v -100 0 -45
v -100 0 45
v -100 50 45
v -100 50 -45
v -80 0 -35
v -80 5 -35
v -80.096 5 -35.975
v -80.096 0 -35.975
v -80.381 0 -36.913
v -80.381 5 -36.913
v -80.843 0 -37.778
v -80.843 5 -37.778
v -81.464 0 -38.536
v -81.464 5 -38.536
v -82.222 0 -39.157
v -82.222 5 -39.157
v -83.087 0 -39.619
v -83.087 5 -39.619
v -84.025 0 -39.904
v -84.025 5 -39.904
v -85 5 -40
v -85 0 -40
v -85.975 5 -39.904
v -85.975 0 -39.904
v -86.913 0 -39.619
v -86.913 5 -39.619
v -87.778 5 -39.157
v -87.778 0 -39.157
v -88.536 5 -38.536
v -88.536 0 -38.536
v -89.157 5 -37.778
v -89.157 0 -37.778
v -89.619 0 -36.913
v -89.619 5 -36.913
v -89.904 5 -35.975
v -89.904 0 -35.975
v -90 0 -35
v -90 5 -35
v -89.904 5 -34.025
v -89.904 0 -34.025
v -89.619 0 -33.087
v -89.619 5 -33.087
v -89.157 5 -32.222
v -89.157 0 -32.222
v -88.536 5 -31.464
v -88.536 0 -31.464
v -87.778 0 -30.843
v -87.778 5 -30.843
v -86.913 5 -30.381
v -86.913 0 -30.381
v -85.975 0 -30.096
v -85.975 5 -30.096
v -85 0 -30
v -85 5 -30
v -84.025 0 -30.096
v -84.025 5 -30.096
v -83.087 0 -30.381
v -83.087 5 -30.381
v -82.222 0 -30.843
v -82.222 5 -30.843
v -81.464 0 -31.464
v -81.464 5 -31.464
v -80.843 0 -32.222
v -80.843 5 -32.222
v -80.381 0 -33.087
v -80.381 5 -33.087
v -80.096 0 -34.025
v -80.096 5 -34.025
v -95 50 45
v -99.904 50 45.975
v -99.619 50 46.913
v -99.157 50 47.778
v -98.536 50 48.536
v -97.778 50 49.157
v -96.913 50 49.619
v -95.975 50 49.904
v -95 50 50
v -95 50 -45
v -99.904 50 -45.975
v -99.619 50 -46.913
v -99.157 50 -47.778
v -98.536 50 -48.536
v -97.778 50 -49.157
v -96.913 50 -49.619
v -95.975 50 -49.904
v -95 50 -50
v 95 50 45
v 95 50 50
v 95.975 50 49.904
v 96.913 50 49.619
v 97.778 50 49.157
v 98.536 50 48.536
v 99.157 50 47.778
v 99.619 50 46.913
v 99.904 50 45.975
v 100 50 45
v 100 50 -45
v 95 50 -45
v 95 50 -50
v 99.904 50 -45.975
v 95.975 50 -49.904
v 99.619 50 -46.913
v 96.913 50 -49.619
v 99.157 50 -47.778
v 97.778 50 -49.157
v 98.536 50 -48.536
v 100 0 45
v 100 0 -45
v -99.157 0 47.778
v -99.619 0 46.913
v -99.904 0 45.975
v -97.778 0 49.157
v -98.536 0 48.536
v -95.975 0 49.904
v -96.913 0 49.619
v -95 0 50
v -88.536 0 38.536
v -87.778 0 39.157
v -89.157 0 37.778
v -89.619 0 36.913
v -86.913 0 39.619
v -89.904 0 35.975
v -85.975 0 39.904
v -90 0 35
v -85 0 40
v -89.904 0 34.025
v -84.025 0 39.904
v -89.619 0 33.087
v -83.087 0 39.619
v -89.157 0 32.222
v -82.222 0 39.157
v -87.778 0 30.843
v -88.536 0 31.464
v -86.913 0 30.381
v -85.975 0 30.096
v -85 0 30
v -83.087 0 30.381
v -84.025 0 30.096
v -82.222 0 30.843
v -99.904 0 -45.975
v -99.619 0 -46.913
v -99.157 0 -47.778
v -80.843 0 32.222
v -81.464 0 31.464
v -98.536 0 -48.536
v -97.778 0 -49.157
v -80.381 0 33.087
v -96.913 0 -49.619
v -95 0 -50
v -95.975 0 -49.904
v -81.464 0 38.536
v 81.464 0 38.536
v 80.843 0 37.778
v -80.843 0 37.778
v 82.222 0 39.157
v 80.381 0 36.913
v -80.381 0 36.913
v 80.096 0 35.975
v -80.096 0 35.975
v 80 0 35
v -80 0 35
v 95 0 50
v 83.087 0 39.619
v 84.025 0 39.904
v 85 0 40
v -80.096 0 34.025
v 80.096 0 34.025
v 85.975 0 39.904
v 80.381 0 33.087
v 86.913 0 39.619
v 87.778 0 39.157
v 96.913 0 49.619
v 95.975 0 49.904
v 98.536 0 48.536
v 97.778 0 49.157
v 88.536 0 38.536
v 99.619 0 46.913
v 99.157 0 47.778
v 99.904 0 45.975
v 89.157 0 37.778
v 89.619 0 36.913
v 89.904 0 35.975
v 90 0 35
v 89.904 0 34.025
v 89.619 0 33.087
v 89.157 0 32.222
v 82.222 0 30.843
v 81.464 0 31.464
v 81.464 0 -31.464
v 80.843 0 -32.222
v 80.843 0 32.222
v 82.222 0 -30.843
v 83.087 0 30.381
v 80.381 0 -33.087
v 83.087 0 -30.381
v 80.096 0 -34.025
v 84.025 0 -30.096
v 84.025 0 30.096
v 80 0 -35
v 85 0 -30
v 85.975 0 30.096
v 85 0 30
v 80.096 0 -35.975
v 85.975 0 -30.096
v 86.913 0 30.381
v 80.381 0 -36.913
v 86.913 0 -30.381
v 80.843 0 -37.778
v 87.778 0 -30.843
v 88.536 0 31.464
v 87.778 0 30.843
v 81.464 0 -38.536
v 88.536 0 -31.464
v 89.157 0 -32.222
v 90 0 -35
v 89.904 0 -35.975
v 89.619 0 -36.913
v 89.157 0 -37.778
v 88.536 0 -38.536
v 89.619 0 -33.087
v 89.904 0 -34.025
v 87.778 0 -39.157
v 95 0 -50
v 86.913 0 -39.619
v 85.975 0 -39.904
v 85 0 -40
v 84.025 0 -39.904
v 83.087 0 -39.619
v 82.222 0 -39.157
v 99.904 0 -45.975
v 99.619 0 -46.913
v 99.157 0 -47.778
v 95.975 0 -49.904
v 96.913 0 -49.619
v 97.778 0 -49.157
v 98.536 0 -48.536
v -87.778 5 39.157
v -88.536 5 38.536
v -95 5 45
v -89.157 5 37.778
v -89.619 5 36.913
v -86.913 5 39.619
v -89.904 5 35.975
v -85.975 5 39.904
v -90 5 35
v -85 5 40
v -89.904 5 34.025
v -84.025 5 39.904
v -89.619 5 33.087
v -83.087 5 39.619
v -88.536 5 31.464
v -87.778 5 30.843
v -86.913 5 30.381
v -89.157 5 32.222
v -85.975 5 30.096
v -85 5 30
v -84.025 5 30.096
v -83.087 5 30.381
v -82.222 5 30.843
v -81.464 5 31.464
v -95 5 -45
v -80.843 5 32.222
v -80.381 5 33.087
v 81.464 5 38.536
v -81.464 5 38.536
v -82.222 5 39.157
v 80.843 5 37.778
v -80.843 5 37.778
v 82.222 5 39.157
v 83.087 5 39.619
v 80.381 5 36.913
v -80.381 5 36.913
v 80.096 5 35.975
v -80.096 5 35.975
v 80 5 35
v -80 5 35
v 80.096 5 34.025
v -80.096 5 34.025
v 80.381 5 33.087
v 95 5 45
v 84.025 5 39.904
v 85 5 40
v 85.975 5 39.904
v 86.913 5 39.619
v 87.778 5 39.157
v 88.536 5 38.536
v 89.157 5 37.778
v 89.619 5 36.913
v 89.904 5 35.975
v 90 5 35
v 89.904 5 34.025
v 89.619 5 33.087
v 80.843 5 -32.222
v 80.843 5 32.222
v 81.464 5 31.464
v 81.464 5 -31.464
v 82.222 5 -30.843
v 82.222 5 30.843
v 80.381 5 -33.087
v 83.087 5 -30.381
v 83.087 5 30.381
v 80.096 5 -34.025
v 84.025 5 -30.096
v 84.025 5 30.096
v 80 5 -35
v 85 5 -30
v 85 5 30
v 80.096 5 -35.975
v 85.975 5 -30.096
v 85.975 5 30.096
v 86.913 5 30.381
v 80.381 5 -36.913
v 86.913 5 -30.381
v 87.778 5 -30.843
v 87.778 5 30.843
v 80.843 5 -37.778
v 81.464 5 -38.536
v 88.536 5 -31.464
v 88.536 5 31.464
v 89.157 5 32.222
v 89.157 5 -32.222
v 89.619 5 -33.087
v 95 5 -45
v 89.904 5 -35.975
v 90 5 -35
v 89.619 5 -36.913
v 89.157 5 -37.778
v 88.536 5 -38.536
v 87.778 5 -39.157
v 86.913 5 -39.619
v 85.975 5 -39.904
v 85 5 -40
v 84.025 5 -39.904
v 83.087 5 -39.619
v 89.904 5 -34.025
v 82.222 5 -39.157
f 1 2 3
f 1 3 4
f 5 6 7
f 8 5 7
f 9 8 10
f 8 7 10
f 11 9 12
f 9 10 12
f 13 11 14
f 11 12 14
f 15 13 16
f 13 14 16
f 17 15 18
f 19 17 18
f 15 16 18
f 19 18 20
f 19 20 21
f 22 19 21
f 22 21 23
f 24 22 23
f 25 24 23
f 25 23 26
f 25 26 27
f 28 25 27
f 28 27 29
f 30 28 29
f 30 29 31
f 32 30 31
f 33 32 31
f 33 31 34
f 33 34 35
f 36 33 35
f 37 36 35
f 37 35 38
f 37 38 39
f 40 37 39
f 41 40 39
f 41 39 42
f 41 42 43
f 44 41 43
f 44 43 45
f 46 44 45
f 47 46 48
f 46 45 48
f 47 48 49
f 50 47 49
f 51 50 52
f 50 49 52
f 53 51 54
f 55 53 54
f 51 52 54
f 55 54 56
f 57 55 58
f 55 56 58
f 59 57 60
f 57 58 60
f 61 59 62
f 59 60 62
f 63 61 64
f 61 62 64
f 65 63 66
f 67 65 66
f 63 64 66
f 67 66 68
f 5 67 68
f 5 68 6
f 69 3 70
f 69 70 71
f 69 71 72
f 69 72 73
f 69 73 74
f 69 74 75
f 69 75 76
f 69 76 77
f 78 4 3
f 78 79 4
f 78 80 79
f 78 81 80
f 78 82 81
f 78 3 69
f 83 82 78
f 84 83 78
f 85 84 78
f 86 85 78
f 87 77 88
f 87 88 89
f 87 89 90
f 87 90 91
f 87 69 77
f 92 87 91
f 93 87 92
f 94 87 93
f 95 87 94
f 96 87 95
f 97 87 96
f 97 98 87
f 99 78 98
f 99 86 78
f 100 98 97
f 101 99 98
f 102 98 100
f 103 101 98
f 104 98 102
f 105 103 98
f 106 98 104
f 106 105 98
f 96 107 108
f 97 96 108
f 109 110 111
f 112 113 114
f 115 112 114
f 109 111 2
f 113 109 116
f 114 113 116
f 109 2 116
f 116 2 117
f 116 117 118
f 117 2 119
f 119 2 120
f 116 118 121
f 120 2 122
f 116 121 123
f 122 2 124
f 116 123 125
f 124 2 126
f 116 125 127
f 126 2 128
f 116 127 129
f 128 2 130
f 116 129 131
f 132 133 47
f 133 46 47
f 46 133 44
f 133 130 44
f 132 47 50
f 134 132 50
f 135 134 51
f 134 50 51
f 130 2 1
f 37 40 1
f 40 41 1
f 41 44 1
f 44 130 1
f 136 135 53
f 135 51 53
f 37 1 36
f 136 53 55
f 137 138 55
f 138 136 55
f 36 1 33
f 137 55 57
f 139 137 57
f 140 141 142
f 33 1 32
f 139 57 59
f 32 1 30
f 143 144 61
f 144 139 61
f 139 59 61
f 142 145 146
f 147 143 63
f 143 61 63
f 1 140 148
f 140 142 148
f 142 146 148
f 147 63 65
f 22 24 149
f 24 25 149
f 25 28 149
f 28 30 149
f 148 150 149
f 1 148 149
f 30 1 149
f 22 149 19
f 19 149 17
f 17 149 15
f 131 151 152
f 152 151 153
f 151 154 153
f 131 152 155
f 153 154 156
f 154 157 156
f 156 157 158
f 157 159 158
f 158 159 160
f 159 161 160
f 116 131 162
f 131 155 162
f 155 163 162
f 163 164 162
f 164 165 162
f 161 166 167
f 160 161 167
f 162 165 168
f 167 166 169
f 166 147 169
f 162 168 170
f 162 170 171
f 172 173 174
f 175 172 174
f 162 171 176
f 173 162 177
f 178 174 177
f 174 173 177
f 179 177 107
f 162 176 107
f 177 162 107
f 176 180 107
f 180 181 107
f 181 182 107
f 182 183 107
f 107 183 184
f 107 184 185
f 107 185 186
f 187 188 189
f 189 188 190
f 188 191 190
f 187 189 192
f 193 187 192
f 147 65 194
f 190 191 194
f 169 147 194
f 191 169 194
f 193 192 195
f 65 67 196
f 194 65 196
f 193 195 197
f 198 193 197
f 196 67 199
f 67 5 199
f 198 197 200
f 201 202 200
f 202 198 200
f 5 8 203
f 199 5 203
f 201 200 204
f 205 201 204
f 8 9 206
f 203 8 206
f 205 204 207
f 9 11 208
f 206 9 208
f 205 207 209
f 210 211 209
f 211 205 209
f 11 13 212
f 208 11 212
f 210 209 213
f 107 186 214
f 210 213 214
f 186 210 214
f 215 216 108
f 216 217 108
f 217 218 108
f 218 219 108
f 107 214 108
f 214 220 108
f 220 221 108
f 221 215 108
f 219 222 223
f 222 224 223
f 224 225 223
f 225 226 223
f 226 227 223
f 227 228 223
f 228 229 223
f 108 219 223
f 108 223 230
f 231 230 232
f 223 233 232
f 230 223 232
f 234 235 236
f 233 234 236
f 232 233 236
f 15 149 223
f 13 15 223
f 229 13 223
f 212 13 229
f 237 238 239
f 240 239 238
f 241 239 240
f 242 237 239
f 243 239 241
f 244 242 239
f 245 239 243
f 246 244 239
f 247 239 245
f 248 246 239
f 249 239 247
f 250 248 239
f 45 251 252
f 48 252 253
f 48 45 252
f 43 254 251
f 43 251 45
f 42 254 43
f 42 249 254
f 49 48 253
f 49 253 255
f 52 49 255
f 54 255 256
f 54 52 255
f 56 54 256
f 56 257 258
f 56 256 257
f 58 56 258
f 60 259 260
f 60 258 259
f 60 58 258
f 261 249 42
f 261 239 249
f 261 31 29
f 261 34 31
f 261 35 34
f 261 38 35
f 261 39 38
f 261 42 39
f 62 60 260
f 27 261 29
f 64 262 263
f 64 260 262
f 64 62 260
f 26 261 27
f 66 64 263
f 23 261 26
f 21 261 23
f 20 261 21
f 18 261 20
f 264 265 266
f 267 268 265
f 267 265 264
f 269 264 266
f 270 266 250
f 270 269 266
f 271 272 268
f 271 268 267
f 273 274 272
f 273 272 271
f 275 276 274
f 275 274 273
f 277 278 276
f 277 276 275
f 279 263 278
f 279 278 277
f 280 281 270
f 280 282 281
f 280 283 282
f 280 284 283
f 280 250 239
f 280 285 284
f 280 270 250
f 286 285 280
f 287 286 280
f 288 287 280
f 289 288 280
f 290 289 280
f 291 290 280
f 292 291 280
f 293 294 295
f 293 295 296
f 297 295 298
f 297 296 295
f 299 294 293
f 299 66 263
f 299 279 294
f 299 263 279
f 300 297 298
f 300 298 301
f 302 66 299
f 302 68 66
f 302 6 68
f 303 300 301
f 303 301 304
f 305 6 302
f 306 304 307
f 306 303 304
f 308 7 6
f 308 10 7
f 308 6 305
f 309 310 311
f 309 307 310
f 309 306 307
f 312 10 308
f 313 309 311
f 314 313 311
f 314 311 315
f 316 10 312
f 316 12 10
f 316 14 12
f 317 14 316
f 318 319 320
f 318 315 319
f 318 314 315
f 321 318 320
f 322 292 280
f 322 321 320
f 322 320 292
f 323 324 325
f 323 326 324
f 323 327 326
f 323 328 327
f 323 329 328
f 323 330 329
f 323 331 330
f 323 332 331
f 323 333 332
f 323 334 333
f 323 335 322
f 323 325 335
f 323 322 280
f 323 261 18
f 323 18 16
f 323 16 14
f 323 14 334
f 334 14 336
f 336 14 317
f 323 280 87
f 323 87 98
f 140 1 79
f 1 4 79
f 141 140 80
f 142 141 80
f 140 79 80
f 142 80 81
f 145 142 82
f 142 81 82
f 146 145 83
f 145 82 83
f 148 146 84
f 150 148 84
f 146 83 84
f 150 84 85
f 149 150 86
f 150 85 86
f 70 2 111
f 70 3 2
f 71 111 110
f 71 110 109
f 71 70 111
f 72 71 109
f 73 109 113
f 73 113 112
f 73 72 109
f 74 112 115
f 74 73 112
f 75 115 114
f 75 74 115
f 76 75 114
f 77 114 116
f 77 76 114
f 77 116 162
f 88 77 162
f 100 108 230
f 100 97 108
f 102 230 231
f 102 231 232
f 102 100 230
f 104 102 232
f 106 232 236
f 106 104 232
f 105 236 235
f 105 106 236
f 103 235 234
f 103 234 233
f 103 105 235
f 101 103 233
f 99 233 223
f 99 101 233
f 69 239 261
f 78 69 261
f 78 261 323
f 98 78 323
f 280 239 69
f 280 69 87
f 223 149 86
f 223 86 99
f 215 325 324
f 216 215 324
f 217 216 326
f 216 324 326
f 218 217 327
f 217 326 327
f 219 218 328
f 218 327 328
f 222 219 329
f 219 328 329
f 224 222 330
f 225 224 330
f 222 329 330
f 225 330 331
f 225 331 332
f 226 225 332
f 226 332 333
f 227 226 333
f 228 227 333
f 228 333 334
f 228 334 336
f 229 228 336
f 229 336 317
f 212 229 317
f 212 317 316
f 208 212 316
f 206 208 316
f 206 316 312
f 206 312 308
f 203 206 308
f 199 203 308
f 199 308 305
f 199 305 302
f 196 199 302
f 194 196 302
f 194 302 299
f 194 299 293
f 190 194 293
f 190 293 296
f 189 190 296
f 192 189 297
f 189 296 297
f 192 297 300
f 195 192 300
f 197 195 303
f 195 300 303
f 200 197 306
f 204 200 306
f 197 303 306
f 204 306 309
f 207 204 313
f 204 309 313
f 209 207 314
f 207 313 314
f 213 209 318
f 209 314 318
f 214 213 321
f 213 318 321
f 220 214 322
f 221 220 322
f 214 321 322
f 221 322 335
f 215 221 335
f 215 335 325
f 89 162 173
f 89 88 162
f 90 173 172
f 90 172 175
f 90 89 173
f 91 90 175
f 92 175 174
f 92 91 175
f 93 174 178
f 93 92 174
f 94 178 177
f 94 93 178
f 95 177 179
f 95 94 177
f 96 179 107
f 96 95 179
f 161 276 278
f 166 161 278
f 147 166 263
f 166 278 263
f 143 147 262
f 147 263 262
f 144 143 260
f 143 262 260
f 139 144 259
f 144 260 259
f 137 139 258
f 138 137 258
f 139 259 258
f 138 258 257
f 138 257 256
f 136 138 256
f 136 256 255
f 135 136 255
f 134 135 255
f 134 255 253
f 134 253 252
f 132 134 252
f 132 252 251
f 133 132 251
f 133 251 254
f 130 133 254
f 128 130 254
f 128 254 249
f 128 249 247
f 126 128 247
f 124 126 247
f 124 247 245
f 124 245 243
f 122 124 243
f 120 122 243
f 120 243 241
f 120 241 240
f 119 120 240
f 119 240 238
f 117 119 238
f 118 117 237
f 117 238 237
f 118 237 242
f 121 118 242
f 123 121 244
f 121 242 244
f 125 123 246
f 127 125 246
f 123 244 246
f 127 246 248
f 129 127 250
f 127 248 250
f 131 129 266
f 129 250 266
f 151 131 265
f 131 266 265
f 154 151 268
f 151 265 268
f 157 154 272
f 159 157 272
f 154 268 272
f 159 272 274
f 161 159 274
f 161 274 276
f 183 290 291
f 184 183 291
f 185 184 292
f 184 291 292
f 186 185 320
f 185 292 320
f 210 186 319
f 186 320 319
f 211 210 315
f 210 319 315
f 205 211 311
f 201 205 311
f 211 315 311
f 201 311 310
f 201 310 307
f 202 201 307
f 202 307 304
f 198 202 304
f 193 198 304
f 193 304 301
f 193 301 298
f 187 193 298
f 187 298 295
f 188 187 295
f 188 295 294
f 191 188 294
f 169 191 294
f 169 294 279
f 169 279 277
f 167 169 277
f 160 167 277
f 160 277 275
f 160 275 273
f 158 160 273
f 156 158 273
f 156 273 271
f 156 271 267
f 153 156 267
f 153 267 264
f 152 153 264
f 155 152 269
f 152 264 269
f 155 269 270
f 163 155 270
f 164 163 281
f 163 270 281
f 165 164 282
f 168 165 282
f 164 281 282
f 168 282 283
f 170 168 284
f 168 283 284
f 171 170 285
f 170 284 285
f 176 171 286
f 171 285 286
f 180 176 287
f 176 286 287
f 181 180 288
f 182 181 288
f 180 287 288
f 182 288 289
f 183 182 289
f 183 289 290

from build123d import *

# Parameters (mm, degrees)
SKETCH1_W           = 200
SKETCH1_H           = 100
BOSS_EXTRUDE1_DEPTH = 50
SHELL1_T            = -5
FILLET1_R           = 5
SKETCH5_R           = 5
CUT_EXTRUDE1_DEPTH  = 6


with BuildPart() as part:
    # Sketch1 → Boss-Extrude1 (new body)
    with BuildSketch(Plane(origin=(0, 0, 0), x_dir=(1, 0, 0), z_dir=(0, 1, 0))):
        Rectangle(SKETCH1_W, SKETCH1_H)
    extrude(amount=BOSS_EXTRUDE1_DEPTH)

    # Shell1
    shell1_openings = [part.faces().sort_by_distance(p)[0] for p in [
        (0, 50, 0),
    ]]
    offset(amount=SHELL1_T, openings=shell1_openings, kind=Kind.INTERSECTION)

    # Fillet1
    fillet1_edges = [part.edges().sort_by_distance(p)[0] for p in [
        (-100, 25, -50),
        (100, 25, -50),
        (100, 25, 50),
        (-100, 25, 50),
    ]]
    fillet(fillet1_edges, radius=FILLET1_R)

    # Sketch5 → Cut-Extrude1 (cut, through all)
    with BuildSketch(Plane(origin=(0, 5, 0), x_dir=(1, 0, 0), z_dir=(0, 1, 0))):
        with Locations((-85, 35)):
            Circle(SKETCH5_R)
        with Locations((85, 35)):
            Circle(SKETCH5_R)
        with Locations((85, -35)):
            Circle(SKETCH5_R)
        with Locations((-85, -35)):
            Circle(SKETCH5_R)
    extrude(amount=-CUT_EXTRUDE1_DEPTH, mode=Mode.SUBTRACT)


solid = part.part
